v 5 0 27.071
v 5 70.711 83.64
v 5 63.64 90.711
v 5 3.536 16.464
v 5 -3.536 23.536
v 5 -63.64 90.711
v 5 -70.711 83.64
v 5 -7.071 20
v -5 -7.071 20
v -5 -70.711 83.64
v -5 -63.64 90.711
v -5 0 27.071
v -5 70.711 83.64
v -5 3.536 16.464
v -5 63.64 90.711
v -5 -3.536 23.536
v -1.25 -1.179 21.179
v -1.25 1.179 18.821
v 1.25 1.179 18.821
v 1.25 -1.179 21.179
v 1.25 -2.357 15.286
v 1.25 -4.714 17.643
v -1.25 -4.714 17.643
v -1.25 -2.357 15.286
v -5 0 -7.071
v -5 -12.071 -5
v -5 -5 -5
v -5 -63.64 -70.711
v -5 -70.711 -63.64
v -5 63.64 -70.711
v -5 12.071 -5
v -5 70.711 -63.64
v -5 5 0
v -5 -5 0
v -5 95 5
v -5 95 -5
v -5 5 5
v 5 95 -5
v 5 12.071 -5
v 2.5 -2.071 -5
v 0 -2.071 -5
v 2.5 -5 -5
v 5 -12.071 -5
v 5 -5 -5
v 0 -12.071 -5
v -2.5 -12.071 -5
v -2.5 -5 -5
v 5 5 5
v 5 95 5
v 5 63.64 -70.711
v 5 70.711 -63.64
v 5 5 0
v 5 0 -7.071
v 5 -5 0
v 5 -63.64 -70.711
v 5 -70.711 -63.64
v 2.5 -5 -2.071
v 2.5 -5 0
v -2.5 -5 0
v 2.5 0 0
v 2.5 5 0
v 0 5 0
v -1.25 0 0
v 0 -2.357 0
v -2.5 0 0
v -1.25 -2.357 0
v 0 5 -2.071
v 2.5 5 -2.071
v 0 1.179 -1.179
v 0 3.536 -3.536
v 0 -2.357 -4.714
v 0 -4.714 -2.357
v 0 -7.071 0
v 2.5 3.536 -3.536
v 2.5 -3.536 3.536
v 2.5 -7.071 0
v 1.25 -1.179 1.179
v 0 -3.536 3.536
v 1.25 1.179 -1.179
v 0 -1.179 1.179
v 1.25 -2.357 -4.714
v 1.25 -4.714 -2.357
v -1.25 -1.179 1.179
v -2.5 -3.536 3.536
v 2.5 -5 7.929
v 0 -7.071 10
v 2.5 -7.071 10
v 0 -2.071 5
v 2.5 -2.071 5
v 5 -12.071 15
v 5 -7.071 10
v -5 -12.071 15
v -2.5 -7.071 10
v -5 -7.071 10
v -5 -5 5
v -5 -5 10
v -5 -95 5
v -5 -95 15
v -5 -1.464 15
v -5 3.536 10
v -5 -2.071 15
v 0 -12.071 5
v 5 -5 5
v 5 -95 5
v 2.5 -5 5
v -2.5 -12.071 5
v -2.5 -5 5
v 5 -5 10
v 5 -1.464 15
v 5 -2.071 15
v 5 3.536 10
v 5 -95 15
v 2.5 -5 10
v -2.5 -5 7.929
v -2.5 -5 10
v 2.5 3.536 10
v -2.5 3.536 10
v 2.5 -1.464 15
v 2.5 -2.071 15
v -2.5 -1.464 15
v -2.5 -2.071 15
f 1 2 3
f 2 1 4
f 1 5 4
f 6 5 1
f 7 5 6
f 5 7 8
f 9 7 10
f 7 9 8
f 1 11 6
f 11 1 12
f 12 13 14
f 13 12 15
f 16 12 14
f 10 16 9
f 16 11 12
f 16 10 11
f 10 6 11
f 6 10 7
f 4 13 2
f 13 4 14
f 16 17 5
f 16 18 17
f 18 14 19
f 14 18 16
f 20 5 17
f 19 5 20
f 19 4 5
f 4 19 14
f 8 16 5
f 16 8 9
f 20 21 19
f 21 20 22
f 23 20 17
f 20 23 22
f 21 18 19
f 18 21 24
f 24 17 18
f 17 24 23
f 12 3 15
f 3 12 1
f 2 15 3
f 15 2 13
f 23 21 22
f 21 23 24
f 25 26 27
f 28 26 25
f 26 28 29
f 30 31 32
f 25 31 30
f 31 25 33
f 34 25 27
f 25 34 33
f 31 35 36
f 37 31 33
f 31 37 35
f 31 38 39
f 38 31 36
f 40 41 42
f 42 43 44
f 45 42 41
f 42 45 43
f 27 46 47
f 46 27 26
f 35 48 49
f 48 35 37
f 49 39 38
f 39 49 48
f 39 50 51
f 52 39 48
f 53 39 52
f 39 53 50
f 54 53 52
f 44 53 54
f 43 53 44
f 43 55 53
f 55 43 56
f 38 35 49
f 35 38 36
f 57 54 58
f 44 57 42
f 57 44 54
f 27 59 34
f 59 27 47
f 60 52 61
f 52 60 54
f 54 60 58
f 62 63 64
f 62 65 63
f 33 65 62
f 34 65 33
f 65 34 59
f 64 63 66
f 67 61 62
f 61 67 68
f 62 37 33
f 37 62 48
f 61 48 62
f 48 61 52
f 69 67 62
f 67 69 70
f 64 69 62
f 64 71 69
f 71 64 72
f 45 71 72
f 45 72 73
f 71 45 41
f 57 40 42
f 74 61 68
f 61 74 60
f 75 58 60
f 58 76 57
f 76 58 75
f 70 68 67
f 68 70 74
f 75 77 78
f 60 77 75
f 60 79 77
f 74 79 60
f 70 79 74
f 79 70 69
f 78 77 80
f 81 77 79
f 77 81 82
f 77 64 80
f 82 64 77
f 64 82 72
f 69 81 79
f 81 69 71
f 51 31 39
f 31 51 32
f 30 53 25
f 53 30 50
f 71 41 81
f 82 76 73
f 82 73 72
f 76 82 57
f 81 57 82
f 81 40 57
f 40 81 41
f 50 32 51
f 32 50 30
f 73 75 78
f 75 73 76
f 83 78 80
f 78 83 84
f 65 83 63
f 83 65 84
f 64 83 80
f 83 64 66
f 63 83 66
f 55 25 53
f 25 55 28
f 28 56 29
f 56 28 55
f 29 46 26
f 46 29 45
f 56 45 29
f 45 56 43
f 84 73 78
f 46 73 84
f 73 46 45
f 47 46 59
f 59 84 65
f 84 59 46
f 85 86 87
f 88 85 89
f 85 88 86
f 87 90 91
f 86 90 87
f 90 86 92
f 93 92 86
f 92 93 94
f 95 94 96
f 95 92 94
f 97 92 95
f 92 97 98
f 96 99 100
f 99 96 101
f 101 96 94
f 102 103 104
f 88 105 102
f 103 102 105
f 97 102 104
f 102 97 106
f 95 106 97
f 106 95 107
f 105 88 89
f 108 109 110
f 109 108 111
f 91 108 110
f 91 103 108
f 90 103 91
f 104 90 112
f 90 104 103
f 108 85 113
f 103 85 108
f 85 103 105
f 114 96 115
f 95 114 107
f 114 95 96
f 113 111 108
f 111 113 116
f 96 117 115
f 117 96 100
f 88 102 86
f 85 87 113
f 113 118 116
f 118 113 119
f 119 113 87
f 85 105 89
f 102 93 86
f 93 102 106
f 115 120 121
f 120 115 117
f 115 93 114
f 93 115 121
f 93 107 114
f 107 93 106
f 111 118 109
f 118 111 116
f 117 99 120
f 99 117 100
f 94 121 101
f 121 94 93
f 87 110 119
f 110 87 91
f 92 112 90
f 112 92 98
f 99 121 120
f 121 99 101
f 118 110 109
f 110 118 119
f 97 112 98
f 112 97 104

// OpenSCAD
// Let's try to do a flat structure.

/*

  Let's put numbers on the beams

  1   2
  6         3
  5   4

*/

BeamLength=100;
BeamDepth=10;
BeamWidth=10;
BeamLip=10;

module base_beam() {
     translate([0, BeamLength/2 - BeamLip/2, 0]) {
          cube([BeamDepth, BeamLength, BeamWidth], center=true);
     }
}


module beam3() {
     difference() {
          rotate([0, 180, 0]) {
               difference() {
                    base_beam();
                    translate([0, 0, -BeamWidth/4]) {
                         cube([BeamDepth, BeamLip, BeamWidth/2], center=true);
                    } 
                    translate([-BeamDepth/8, 0, 0]) {
                         cube([BeamDepth/4, BeamLip, BeamWidth], center=true);
                    } 
                 /*   cube([BeamDepth, BeamLip, BeamWidth], center=true);
                 */
/*   translate([0, 0, -BeamWidth/2]) {
                         cube([BeamDepth, BeamLip, BeamWidth/2], center=true);
                    } 
                    translate([0, 0, BeamWidth/2]) {
                         cube([BeamDepth, BeamLip, BeamWidth/2], center=true);
                    } */
              
               }
          
               //   beam4();
               // beam2();
               // beam1();
          }
         //  beam2();
     }
}



module beam6() {
     difference() {
          rotate([180, 0, 0]) {
               difference() {
                    base_beam();
                  
               }
          }
        //  beam5();

          /*

           
            beam1(); */

          // this is the shape of beam1
          beam1_mask();
          beam4();
          beam5();
          beam3();
     }
}

module beam1_mask() {
     rotate([135, 0, 0]) {
          translate([0, -BeamLip/2, -BeamWidth/2]) {
               cube([BeamWidth/2, BeamLip*2, 2* BeamWidth], center=true);
          }
          translate([0, 0, -BeamWidth]) {
               cube([BeamWidth, BeamLip, BeamWidth], center=true);
          } 
          difference() {
               base_beam();
               translate([0, 0, BeamWidth/8]) {
                    cube([BeamDepth, BeamLip, 3*BeamWidth/4], center=true);
               }
          }
    
}
}


module beam4() {
     difference() {
          rotate([-45, 0, 0]) {
               base_beam(); 
          }
          translate([BeamWidth/2 - BeamDepth/4, -BeamWidth, - BeamLip/2]) {
               cube([BeamDepth/4, BeamWidth*4, BeamWidth*2]);
          }
          translate([- BeamWidth/2, -BeamWidth , - BeamLip/2]) {
               cube([BeamDepth/2, BeamWidth*4, BeamWidth*2]);
          }
          beam2();
          beam1();
     }
} 


module beam5() {
     difference() {
          rotate([-135, 0, 0]) {
               base_beam();
          }
          translate([BeamWidth/2 - BeamDepth/2, -2*BeamWidth , - BeamLip/2]) {
               cube([BeamDepth/2, BeamWidth*4, BeamWidth*2]);
          }
          translate([- BeamWidth/2, -2*BeamWidth , - BeamLip/2]) {
               cube([BeamDepth/4, BeamWidth*4, BeamWidth*2]);
          }
          beam2();
          beam1();
     }
  
     
}


module beam2() {
     difference() {
          rotate([45, 0, 0]) {
               cube([BeamDepth/4, BeamLip, BeamWidth/3], center=true);
               difference() {
                    base_beam();
                    cube([BeamDepth, BeamLip, BeamWidth], center=true); 
               }
          };
         
     }
     
}


module beam1() {
     difference() {
          rotate([135, 0, 0]) {
        
               difference() {
                    base_beam();
                    //   cube([BeamDepth, BeamLip, BeamWidth/2], center=true);
                    /* translate([0, 0, 2 * BeamWidth/6]) {
                       cube([BeamDepth, BeamLip, BeamWidth/3], center=true);
                       }
                       translate([0, 0, -2 * BeamWidth/6]) {
                       cube([BeamDepth, BeamLip, BeamWidth/3], center=true);
                       } */
                    translate([0, 0, BeamWidth/4]) {
                         cube([BeamDepth, BeamLip, BeamWidth/2], center=true);
                    }
               }
          }
          beam2();
        //  beam3();
     }
     
     
}


translate([0, 0, 20]) {
     beam1();
}

translate([0, 0, 20]) {
     beam2();
}

translate([0, 0, 0]) {
     beam3();     
}


// these two would be pretty solid.

translate([0, 0, 0]) {
     beam4();
}

translate([0, 0, 0]) {
     beam5();
} 

translate([0, 0, 10]) {
     beam6();
}
